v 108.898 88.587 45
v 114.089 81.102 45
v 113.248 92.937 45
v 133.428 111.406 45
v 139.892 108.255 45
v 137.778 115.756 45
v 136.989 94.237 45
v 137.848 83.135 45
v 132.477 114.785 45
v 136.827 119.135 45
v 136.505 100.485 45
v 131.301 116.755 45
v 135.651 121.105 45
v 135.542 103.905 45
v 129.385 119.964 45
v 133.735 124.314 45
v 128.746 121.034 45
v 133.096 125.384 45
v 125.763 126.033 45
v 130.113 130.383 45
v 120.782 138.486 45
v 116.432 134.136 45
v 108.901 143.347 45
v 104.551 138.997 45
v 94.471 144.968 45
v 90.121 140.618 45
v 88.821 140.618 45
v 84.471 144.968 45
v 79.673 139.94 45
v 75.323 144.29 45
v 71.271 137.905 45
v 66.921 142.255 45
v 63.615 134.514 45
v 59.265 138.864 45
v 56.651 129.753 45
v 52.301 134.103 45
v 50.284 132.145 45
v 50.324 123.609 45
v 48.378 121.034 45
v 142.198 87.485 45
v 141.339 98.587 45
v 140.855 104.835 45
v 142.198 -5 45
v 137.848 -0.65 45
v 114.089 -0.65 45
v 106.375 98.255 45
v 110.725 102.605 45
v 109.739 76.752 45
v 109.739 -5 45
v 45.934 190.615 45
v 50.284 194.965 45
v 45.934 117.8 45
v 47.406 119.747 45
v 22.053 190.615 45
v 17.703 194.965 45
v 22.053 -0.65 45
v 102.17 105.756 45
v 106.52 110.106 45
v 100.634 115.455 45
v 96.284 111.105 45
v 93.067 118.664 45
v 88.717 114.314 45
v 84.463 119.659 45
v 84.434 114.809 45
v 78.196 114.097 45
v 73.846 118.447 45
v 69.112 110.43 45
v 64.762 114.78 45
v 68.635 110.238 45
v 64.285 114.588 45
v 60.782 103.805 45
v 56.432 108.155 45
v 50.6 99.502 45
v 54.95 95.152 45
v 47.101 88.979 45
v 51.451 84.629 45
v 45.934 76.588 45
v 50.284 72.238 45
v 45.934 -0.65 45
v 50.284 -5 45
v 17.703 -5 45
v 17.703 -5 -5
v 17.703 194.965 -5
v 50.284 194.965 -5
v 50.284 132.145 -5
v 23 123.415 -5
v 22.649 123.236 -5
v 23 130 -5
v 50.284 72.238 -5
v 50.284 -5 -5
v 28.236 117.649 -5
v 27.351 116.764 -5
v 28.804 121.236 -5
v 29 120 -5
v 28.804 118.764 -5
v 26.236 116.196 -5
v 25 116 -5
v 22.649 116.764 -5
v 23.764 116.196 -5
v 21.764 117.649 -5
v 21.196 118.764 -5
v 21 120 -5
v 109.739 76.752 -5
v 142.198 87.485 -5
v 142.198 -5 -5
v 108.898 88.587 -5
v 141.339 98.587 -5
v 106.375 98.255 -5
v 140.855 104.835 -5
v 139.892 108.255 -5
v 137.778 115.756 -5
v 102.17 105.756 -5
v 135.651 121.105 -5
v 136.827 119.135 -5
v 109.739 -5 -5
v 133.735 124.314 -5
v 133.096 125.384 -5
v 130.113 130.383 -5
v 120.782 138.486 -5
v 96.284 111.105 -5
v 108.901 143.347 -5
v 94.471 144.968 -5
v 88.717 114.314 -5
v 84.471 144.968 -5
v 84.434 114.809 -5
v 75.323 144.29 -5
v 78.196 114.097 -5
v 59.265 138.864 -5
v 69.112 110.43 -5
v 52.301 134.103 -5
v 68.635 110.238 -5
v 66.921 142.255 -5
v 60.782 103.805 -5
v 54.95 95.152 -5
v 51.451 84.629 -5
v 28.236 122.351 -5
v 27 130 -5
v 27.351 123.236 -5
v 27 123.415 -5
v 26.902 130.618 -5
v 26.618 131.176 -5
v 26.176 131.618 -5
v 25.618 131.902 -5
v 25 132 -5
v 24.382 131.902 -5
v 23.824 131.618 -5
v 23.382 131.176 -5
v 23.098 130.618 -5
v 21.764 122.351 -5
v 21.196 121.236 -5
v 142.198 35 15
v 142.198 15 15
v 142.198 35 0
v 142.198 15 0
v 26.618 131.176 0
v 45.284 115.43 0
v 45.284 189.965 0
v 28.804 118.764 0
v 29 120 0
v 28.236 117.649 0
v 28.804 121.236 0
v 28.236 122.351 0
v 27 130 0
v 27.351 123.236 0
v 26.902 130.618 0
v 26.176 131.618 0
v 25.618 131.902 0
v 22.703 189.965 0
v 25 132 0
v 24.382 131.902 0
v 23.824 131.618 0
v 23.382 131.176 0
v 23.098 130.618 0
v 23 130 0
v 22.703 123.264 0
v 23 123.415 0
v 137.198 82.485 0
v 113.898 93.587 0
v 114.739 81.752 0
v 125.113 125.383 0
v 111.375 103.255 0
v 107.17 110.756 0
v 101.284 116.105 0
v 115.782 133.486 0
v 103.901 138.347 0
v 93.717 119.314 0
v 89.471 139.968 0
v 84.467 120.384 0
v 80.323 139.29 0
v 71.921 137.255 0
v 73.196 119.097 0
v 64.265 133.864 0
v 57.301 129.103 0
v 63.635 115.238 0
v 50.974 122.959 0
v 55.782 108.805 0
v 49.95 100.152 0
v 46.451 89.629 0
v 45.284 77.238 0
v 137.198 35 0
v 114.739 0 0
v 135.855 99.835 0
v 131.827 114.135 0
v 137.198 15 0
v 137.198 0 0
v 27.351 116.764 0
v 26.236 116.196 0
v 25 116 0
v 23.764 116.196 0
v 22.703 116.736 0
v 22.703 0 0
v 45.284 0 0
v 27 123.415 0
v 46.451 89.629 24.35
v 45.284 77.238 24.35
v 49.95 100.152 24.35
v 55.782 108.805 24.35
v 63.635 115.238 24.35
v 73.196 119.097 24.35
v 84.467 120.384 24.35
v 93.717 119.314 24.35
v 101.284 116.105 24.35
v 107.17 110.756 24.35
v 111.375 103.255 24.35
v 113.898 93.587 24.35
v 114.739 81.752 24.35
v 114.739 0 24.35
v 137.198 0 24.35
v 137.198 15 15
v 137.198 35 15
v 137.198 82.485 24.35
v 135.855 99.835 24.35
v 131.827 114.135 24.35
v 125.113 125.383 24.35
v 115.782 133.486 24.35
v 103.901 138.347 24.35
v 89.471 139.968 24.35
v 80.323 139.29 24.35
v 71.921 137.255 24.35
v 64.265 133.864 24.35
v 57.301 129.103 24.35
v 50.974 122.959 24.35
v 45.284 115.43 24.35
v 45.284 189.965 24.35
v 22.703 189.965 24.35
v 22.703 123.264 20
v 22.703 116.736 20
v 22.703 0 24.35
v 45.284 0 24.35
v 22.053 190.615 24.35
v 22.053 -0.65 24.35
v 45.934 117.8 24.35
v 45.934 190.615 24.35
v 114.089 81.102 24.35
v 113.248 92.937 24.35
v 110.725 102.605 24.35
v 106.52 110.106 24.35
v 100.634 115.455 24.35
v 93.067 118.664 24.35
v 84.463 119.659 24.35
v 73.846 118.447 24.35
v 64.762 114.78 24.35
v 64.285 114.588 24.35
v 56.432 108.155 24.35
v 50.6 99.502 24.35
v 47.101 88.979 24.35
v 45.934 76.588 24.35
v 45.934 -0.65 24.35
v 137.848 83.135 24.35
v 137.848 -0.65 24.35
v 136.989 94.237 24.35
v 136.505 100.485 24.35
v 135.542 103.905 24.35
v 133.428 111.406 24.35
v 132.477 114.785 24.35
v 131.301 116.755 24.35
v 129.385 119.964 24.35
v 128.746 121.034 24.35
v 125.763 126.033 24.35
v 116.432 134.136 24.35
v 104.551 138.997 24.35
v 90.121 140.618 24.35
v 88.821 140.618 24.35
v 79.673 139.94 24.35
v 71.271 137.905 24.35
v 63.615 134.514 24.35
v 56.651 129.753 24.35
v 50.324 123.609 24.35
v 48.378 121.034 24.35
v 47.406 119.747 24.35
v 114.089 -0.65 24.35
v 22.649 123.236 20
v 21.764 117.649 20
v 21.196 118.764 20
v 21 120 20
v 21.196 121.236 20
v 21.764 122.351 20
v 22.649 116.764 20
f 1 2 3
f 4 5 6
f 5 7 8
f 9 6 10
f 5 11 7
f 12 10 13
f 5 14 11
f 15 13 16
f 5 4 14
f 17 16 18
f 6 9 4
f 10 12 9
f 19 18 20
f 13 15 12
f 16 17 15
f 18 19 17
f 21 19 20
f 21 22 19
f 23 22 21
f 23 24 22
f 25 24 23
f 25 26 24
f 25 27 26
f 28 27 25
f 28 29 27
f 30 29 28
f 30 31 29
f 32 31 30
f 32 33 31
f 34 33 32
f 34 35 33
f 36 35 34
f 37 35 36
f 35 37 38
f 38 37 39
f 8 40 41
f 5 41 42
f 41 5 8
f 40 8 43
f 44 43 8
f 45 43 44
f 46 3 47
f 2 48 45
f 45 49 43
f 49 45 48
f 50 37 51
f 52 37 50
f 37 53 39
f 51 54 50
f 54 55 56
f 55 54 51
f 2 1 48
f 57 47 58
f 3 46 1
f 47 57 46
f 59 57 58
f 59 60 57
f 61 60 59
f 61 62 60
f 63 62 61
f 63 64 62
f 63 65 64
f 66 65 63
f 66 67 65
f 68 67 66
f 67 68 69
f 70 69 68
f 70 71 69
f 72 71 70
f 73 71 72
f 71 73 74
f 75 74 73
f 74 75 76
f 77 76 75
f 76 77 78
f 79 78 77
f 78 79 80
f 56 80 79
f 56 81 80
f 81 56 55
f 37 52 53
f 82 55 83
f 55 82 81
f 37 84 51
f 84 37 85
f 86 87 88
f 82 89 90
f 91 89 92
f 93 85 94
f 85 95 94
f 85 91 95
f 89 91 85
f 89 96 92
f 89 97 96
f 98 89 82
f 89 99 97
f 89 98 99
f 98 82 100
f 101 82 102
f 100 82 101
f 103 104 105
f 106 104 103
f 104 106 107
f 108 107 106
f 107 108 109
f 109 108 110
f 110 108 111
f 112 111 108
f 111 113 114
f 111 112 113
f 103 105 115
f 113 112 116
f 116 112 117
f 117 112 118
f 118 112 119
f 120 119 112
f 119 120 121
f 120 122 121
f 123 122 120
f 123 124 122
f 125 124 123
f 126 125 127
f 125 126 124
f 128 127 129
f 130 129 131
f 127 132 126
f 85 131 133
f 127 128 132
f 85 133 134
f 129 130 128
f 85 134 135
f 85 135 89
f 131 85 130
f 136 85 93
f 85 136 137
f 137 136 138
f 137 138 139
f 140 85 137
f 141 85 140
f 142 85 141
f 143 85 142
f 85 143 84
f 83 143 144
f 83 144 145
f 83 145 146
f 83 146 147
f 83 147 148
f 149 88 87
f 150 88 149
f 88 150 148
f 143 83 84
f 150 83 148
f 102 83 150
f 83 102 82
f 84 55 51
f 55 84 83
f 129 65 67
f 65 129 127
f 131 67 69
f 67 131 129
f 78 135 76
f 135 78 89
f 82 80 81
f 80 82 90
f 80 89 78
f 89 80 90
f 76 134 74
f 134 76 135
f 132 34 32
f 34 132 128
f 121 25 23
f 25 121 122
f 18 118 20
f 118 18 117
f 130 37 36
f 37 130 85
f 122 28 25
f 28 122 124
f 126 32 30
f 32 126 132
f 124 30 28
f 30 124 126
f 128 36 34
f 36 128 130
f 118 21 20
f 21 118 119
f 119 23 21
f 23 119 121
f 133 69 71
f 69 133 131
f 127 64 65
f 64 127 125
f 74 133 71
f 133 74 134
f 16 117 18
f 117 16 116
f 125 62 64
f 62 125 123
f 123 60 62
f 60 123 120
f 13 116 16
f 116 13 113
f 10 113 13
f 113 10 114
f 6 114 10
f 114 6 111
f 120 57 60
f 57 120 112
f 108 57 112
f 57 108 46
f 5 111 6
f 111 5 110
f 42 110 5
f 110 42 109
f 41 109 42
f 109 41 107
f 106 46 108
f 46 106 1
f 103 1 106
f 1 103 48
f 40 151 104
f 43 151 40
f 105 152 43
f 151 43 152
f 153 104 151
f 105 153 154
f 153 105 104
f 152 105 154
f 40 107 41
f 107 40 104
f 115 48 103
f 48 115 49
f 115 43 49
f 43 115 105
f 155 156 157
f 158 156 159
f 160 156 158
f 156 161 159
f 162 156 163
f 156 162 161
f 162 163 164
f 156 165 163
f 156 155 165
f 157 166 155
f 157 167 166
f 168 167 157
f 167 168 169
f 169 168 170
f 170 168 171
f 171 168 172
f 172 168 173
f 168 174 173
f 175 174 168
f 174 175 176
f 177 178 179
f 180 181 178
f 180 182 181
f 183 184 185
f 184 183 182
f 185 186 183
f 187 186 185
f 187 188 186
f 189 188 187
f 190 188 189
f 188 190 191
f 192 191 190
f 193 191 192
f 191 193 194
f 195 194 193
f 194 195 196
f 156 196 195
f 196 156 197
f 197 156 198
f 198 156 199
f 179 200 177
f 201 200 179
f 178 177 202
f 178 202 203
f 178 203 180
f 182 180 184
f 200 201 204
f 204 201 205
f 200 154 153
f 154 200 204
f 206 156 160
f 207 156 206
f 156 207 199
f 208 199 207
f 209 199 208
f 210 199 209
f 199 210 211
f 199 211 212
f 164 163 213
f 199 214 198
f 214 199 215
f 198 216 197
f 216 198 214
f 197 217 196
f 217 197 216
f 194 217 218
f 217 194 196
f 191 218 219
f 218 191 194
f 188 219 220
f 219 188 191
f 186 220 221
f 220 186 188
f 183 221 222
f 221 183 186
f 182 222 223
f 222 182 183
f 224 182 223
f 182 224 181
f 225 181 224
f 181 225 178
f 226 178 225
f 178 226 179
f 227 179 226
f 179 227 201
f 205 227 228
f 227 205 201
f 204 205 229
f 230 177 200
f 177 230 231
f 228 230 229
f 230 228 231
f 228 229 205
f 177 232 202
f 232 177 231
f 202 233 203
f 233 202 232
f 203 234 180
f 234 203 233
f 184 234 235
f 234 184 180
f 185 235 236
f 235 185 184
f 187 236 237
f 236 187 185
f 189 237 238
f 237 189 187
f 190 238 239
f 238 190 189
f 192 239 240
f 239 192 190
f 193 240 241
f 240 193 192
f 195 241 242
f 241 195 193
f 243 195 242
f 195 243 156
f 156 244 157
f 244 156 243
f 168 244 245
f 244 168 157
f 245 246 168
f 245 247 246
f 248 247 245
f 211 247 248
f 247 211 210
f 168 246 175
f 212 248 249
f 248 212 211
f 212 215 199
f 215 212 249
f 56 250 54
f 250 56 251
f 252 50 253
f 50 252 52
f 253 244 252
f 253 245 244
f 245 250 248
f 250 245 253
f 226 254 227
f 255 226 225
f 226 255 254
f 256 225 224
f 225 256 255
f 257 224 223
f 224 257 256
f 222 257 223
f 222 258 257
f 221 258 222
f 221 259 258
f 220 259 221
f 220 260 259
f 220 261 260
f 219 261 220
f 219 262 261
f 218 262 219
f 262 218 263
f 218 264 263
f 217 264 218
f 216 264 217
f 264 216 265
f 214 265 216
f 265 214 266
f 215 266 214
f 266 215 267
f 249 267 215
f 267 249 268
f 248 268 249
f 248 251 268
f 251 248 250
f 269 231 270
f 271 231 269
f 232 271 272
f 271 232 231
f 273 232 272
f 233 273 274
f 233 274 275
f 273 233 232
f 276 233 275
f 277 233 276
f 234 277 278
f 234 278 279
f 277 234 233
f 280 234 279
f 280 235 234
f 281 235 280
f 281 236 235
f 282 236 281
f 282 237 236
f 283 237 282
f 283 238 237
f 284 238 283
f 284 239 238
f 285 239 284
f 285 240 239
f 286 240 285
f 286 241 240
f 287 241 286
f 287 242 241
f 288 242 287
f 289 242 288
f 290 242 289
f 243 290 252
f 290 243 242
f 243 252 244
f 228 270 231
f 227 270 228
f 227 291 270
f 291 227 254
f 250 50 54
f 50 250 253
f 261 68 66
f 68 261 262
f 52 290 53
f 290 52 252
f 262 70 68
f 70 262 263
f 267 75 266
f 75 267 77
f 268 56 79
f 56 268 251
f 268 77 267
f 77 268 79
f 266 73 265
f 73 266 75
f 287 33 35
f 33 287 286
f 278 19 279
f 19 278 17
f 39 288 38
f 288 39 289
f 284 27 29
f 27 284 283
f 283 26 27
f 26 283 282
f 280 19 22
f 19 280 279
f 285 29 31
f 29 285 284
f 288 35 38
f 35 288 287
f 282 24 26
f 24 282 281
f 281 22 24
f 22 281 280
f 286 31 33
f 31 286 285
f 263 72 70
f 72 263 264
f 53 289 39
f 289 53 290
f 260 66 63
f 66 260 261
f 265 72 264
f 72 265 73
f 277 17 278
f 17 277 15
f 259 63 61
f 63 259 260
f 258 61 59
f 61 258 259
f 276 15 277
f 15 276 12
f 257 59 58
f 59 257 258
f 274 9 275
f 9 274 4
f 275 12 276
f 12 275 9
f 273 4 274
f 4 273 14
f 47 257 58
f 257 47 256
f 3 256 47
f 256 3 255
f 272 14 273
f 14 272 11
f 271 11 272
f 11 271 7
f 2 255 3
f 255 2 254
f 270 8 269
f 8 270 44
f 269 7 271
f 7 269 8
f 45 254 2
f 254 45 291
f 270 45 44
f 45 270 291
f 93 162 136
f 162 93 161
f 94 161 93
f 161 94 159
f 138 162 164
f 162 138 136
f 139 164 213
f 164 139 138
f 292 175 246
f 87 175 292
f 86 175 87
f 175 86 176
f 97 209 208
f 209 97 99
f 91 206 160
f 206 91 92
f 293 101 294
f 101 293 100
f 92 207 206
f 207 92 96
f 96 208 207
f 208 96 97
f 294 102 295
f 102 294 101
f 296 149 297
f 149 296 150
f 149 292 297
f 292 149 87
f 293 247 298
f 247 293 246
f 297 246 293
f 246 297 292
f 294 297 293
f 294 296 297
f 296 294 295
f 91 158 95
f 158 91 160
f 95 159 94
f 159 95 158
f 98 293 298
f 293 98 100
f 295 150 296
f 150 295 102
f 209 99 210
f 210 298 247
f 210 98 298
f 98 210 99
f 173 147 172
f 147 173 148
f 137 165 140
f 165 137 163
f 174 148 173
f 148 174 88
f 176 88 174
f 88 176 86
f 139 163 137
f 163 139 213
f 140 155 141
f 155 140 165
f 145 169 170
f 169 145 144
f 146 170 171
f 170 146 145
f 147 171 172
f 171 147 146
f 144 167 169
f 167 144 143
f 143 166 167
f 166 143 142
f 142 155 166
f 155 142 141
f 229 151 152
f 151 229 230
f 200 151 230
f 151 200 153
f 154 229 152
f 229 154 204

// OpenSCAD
$fn = 20;

font = "Nooble Wooble";
height = 40;
font_size = 180;

wall = 10;

// inserts
// adding 0.1 because different letters have different
// curves and thicknesses, so 0.1 allows some room for that
// the excess can be trimmed after printing if necessary.

insert_wall = 0.8 + 0.1;
insert_height = height/2;
insert_support_wall_sub = 1;

// distance difference for insert support = 1 mm
// this leaves a gap of insert 
// wall - 1.3mm leaves 0.5mm gap for the 0.8mm insert

support_wall_sub = wall - 1.3;

// bottom letters are thicker to support
// the top letters

bottom_height = height *2;

led_length = 20;
led_width = 30;
//led_height = height;
led_height = 15;

//cable pass trhough hole from top to bottom
pass_through_length = 10;
pass_through_width = 10;

h_x = 0;
e_x = 135;
l1_x = 268;
l2_x = 325;
o1_x = 379;

w_y = -190;
w_z = 0;

o2_x = 200;
o2_y = w_y; 

r_x = 353;
r_y = w_y;

l3_x = 497;
l3_y = w_y;

d_x = 552;
d_y = w_y;

exclamation_x = 703;
exclamation_y = w_y;

wall_mount_y_top = 120;
wall_mount_y_bottom = -85;

h();
//e();
//l1();
//l2();
//o1();

//w();
//o2();
//r();
//l3();
//d();
//exclamation();

//inserts
//h_insert();
//e_insert();
//l1_insert();
//l2_insert();
//o1_insert();

//w_insert();
//o2_insert();
//r_insert();
//l3_insert();
//d_insert();
//exclamation_insert();

// wall mount test
//difference(){
//    cube([20,20,5]);
//    translate([10,6,0])
//    wall_mount_hole();
//}

//lol1n hole test
//difference(){
//    cube([30,60,5]);
//    
//    translate([2.5,4,0])
//    lol1n_holes();
//}

module h(){
    difference(){
        letter("h",
               font,
               font_size,
               height,
               wall,
               support_wall_sub);
        
        translate([e_x - led_width/2 ,15,0])
        cube([led_width,led_length,led_height]);
        
        translate([20,-38,- wall])
        cube([pass_through_width,
              pass_through_length,
              height]);
        
        translate([25,wall_mount_y_top,0])
        wall_mount_hole();
    }
}

module h_insert(){
    letter("h",
       font,
       font_size,
       height,
       insert_wall);
}

module e(){
    difference(){
        // h and e cross section
        translate([e_x,0,0])
        letter("e",
               font,
               font_size,
               height,
               wall,
               support_wall_sub);
        
        letter("h",
               font,
               font_size,
               height,
               wall,
               support_wall_sub,
               hollow=false);
        
        translate([l1_x - led_width/2 ,0,0])
        cube([led_width,led_length,led_height]);
    }
}

module e_insert(){
    difference(){
        minkowski(){
            difference(){
                translate([e_x,0,0])
                make_text("e",
                          font,
                          font_size,
                          insert_height);

                letter("h",
                       font,
                       font_size,
                       height,
                       wall,
                       hollow=false);
            }
            
            cube(insert_wall, center=true);
        }
        
    minkowski(){
        difference(){
            translate([e_x,0,0])
            make_text("e",
                      font,
                      font_size,
                      insert_height);

            letter("h",
                   font,
                   font_size,
                   height,
                   wall,
                   hollow=false);
            }

    }
        translate([font_size*2 - font_size*2/2,
                   0,
                   height/2])
        cube([font_size*2,font_size*2,insert_wall+0.001],true);
    }
}

module l1(){
    difference(){
        // h and e cross section
        translate([l1_x,0,0])
        letter("l",
               font,
               font_size,
               height,
               wall,
               support_wall_sub);
        
        translate([e_x,0,0])
        letter("e",
               font,
               font_size,
               height,
               wall,
               support_wall_sub,
               hollow=false);
        
        translate([l1_x - led_width/2 ,0,0])
        cube([led_width,led_length,led_height]);
        
        translate([l2_x - led_width/2 ,-20,0])
        cube([led_width,led_length,led_height]);
    }
}

module l1_insert(){
    translate([l1_x,0,0])
    letter("l",
       font,
       font_size,
       height,
       insert_wall);
}

module l2(){
    difference(){
        // h and e cross section
        translate([l2_x,0,0])
        letter("l",
               font,
               font_size,
               height,
               wall,
               support_wall_sub);
        
        translate([l1_x,0,0])
        letter("l",
               font,
               font_size,
               height,
               wall,
               support_wall_sub,
               hollow=false);
        
        translate([l2_x - led_width/2 ,-20,0])
        cube([led_width,led_length,led_height]);
        
        translate([o1_x - led_width/2 ,20,0])
        cube([led_width,led_length,led_height]);
    }
}

module l2_insert(){
    translate([l2_x,0,0])
    letter("l",
       font,
       font_size,
       height,
       insert_wall);
}

module o1(){
    difference(){
        // h and e cross section
        translate([o1_x,0,0])
        letter("o",
               font,
               font_size,
               height,
               wall,
               support_wall_sub);
        
        translate([l2_x,0,0])
        letter("l",
               font,
               font_size,
               height,
               wall,
               support_wall_sub,
               hollow=false);
        
        translate([o1_x - led_width/2 ,20,0])
        cube([led_width,led_length,led_height]);
        
        translate([o1_x+ 70,wall_mount_y_top,0])
        wall_mount_hole();
    }
}

module o1_insert(){
    translate([o1_x,0,0])
    letter("o",
       font,
       font_size,
       height,
       insert_wall);
}

module w(){
    difference(){
        translate([0,w_y,w_z])
        letter("w",
               font,
               font_size,
               height,
               wall,
               support_wall_sub);
        
        translate([o2_x - 20 ,o2_y + 30,0])
        cube([led_width,led_length,led_height]);
        
        translate([20,-68,-wall])
        cube([pass_through_length,
              pass_through_width,
              height]);

        translate([95, w_y+80,0])
        LM2596_holes();
        
        translate([10,w_y+10,0])
        lol1n_holes();
        
        translate([25,wall_mount_y_bottom,0])
        wall_mount_hole();
    }
    

}


module w_insert(){
    translate([0,w_y,0])
    letter("w",
       font,
       font_size,
       height,
       insert_wall);
}


module o2(){
    difference(){
        // h and e cross section
        translate([o2_x,o2_y,0])
        letter("o",
               font,
               font_size,
               height,
               wall,
               support_wall_sub);
        
        translate([0,w_y,0])
        letter("w",
               font,
               font_size,
               height,
               wall,
               support_wall_sub,
               hollow=false);
               
        translate([o2_x - 20 ,o2_y + 30,0])
        cube([led_width,led_length,led_height]);
        
        translate([r_x - led_width/2 ,r_y + 35,0])
        cube([led_width,led_length,led_height]);
    }
    

}

module o2_insert(){
    translate([o2_x,o2_y,0])
    letter("o",
       font,
       font_size,
       height,
       insert_wall);
}

module r(){
    difference(){
        // h and e cross section
        translate([r_x,r_y,0])
        letter("r",
               font,
               font_size,
               height,
               wall,
               support_wall_sub);
        
        translate([o2_x,o2_y,0])
        letter("o",
               font,
               font_size,
               height,
               wall,
               support_wall_sub,
               hollow=false);
               
        translate([r_x - led_width/2 ,r_y + 35,0])
        cube([led_width,led_length,led_height]);
        
        translate([l3_x - 20 ,l3_y + 70,0])
        cube([led_width,led_length,led_height]);
    }
}

module r_insert(){
    translate([r_x,r_y,0])
    letter("r",
       font,
       font_size,
       height,
       insert_wall);
}

module l3(){
    difference(){
        translate([l3_x,l3_y,0])
        letter("l",
               font,
               font_size,
               height,
               wall,
               support_wall_sub);
        
        translate([r_x,r_y,0])
        letter("r",
               font,
               font_size,
               height,
               wall,
               support_wall_sub,
               hollow=false);
        
        translate([l3_x - 20 ,l3_y + 70,0])
        cube([led_width,led_length,led_height]);
        
        translate([d_x - 20 ,d_y-15,0])
        cube([led_width,led_length,led_height]);
    }
}

module l3_insert(){
    translate([l3_x,l3_y,0])
    letter("l",
       font,
       font_size,
       height,
       insert_wall);
}

module d(){
    difference(){
        translate([d_x,d_y,0])
        letter("d",
               font,
               font_size,
               height,
               wall,
               support_wall_sub);
        
        translate([l3_x,l3_y,0])
        letter("l",
               font,
               font_size,
               height,
               wall,
               support_wall_sub,
               hollow=false);
        
        translate([d_x - 20 ,d_y-15,0])
        cube([led_width,led_length,led_height]);
        
        translate([exclamation_x-15,
                   exclamation_y +70,
                   0])
        cube([led_width,led_length,led_height]);
    }
}

module d_insert(){
    translate([d_x,d_y,0])
    letter("d",
       font,
       font_size,
       height,
       insert_wall);
}

module exclamation(){
    difference(){
        translate([exclamation_x,exclamation_y,0])
        letter("!",
               font,
               font_size,
               height,
               wall,
               support_wall_sub);
        
        translate([d_x,d_y,0])
        letter("d",
               font,
               font_size,
               height,
               wall,
               support_wall_sub,
               hollow=false);
        
        translate([exclamation_x-15,
                   exclamation_y +70,
                   0])
        cube([led_width,led_length,led_height]);
        
        translate([exclamation_x+40,
                   exclamation_y ,
                   0])
        rotate(90)
        cube([led_width,led_length,led_height]);
        
        translate([exclamation_x + 35,
                   wall_mount_y_bottom,
                   0])
        wall_mount_hole();
        
        // power hole for dc adapter
        translate([exclamation_x+23, exclamation_y-20,wall-3])
        rotate([90,0,0])
        cylinder(r=11/2, h=height);
    }
    
    
    difference(){
        translate([exclamation_x+23,
                   exclamation_y-35,
                   7])
        rotate([180,0,0])
        color("red")
        dc_female_plug_insert();
        
        translate([exclamation_x+12,
                   exclamation_y-35,
                   8])
        cube([20,100,20]);
    }


    // dc_adapter_support
    difference(){
        translate([exclamation_x+14.5,
                   exclamation_y-35,0])
        cube([17.07,18.5,5]);
        
        difference(){
            translate([exclamation_x+23,
                       exclamation_y-35,
                       7])
            scale([1.2,1.2,1.2])
            rotate([180,0,0])
            dc_female_adapter();
        }
    }

}


module exclamation_insert(){
    translate([exclamation_x,exclamation_y,0])
    letter("!",
       font,
       font_size,
       height,
       insert_wall);
}

module wall_mount_hole(){
    insert_r = 8/2;
    slide_r = 4/2;
    slide_length = 10;
    
    cylinder(r = insert_r,
             h = height,
             center = true);

    hull(){
        cylinder(r = slide_r, h = height, center=true);
        
        translate([0,slide_length,0])
        cylinder(r = slide_r, h = height, center=true);
    }
}

module lol1n_holes(){
    
    // measure using caliper
    x_dist = 25;
    y_dist = 52;
    
    //m2.5 screws;
    screw_r = 2.75/2;
    
    cylinder(r=screw_r, h = height, center=true);
    
    translate([x_dist,0,0])
    cylinder(r=screw_r, h = height, center=true);
    
    translate([0,y_dist,0])
    cylinder(r=screw_r, h = height, center=true);
    
    translate([x_dist,y_dist,0])
    cylinder(r=screw_r, h = height, center=true);
}

module LM2596_holes(){
    y_dist = 30;
    x_dist = 15;
    
    standoff_r = 2.7/2;
    
    translate([0, 0, 0])
    cylinder(r=standoff_r, h=height, center=true);
    
    translate([x_dist, -y_dist, 0])
    cylinder(r=standoff_r, h=height, center=true);
}


module dc_female_plug_insert(){
    plug_r = 7/2;
    plug_h = 2.30;
    
    plug_depth = 32;
    
    plug_plastic_r = 10/2;
        
    plug_rect_height = 12;
    plug_rect_width = 14.30;
    
    
    inside_size = 1.05;
    outside_size = 1.2;
    
    wall_width = inside_size - outside_size;
    
    plug_front_r = plug_r * inside_size;
    
    holder_wall_width = 0.5;
    holder_width = 1.5;

    
    difference(){
        scale([outside_size, outside_size, outside_size]) {
            dc_female_adapter();
        }
        
       // plug tip
       rotate([90,0,0])
       translate([0,0,0])
       cylinder(r=plug_r * inside_size, h=plug_h);
        
       rotate([90,0,0])
       translate([0,0,plug_h])
       cylinder(r=plug_plastic_r * inside_size, h=plug_depth * inside_size);
        
        translate([0,-inside_size - outside_size -3 , 0])
        scale([inside_size,inside_size,inside_size]){
              dc_female_adapter();
            }
       }
       
    // back to hold it in place
    translate([plug_rect_width * inside_size /2 -holder_width +0.8,-plug_depth * inside_size - 1.45+ plug_h,0])
    cube([holder_width,holder_wall_width,plug_rect_height * outside_size], true);
       
    //translate([-plug_rect_width/2 - wall_width - holder_width/2,-plug_depth * outside_size + holder_wall_width,-7.2])
    //cube([holder_width,holder_wall_width,plug_rect_height * outside_size]);
    }
    

// this can be changeed to a cylinder for better consistency
module dc_female_adapter(){
    // these values need to be confirmed with a caliper
    
    plug_r = 7/2;
    plug_h = 2.30;
    
    plug_plastic_r = 10/2;
    plug_plastic_h = 5.5;
    
    // adding a bit more room to greate holder for insert
    room = 1;

    
    plug_rect_width = 14.30;
    plug_rect_height = 12;
    plug_rect_depth = 11;
    
    cone_h = 10;
    
    // tip of plug
    //rotate([90,0,0])
    //cylinder(r=plug_r, h=plug_h);
    
    // plastic after tip
    rotate([90,0,0])
    translate([0, 0,0])
    cylinder(r=plug_plastic_r , h=plug_rect_depth);
        
    // cone of plug with squared top
    
    //translate([0,- plug_h - plug_plastic_h- cone_h,0])
    translate([0,-plug_plastic_h- cone_h ,0])
    rotate([-90,0,0])
    hull(){
    rotate([90,0,0])
    cube([plug_rect_width,0.1, plug_rect_height], true);
        
    cylinder(r2=plug_plastic_r, h=cone_h);
    }
    
    difference(){
    
    // end of plug
    //translate([0,,plug_h - plug_plastic_h - cone_h- plug_rect_depth + 1])
    translate([0,-plug_plastic_h - cone_h - 6.0])
    cube([plug_rect_width,plug_rect_depth + room , plug_rect_height], true);
        
        
    translate([0,-plug_plastic_h - cone_h- 1.2 -10.79])
    cube([plug_rect_width -room -0.78, 2,plug_rect_height+ room], true);
    }
}


module letter(character,
              font,
              font_size,
              height,
              wall,
              support_wall_sub,
              hollow=true){
                  

    difference(){
        hollow_letter(character,
                      font,
                      font_size,
                      height,
                      wall,
                      hollow=hollow);
        
        if (hollow){
            translate([0,0,(wall/2)- height/2])
            support(character,
                    font,
                    font_size,
                    height,
                    wall,
                    support_wall_sub);
        }
    }
}

module make_text(character, font, font_size, height){
    linear_extrude(height=height)
    text(character,font_size,font);
}

module hollow_letter(character,
                     font,
                     font_size,
                     height,
                     wall,
                     support_wall_sub,
                     hollow =true){

    difference(){
        //container
        minkowski(){
            make_text(character,
                      font,
                      font_size,
                      height);
            
            cube([wall,wall,wall],center=true);
        }
        
        if (hollow){
            make_text(character,
                      font,
                      font_size,
                      height);
        }
    }
}

module support(character,
               font,
               font_size,
               height,
               wall,
               wall_sub){

    color("pink")
    translate([0,0,height])
    minkowski(){
        make_text(character, font, font_size, height);
        cube(wall - wall_sub,
              center=true);
        }
}
